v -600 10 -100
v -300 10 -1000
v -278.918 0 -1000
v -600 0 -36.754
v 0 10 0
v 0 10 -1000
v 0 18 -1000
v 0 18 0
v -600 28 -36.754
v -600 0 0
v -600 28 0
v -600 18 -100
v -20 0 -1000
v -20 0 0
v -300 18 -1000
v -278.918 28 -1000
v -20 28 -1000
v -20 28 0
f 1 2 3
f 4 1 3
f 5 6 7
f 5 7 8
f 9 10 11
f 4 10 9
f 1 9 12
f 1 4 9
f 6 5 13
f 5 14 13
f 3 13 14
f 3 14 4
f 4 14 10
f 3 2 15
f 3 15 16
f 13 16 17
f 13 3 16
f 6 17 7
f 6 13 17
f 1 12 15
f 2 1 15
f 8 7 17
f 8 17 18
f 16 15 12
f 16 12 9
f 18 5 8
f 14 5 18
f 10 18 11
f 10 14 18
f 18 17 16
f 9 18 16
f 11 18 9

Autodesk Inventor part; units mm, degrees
ref_plane "YZ Plane" through (0, 0, 0) normal (1, 0, 0) x (0, 1, 0)
ref_plane "XZ Plane" through (0, 0, 0) normal (0, 1, 0) x (-1, 0, 0)
sketch "Sketch1" plane through (0, 0, 0) normal (0, 1, 0) x (-1, 0, 0)
  line L0 (0, 0) -> (600, 0)
  line L1 (600, 0) -> (600, -1000)
  line L2 (600, -1000) -> (0, -1000)
  line L3 (0, -1000) -> (0, 0)
  dimension "d0" = 1000
  dimension "d1" = 600
extrude "Extrusion1" add sketch "Sketch1" along normal blind 28
sketch "Sketch2" plane through (0, 28, 0) normal (0, 1, 0) x (1, 0, 0)
  line L0 (-600, 1000) -> (-600, 0) projected
  line L1 (0, 1000) -> (-600, 1000) projected
  line L2 (0, 1000) -> (-600, 1000) projected
  line L3 (-600, 1000) -> (-600, 0) projected
  line L4 (-600, 0) -> (0, 0) projected
  line L5 (0, 0) -> (0, 1000) projected
  line L6 (-600, 100) -> (-300, 1000)
  dimension "d7" = 300
  dimension "d8" = 100
extrude "Extrusion2" cut sketch "Sketch2" against normal blind 200 contours L1 L6 L0
ref_plane "Work Plane1" through (0, 14, 0) normal (0, 1, 0) x (1, 0, 0)
sketch "Sketch3" plane through (0, 28, 0) normal (0, 1, 0) x (1, 0, 0)
  circle A0 centre (-305, 20) radius 8
  line L0 (0, 0) -> (0, 1000) projected
  line L1 (-600, 0) -> (0, 0) projected
  circle A1 centre (-395, 20) radius 8
  circle A2 centre (-350, 75) radius 8
  circle A3 centre (-350, 160) radius 8
  dimension "d9" = 16
  dimension "d10" = 305
  dimension "d11" = 20
  dimension "d12" = 16
  dimension "d13" = 395
  dimension "d14" = 20
  dimension "d15" = 16
  dimension "d16" = 350
  dimension "d17" = 75
  dimension "d18" = 16
  dimension "d19" = 350
  dimension "d20" = 160
extrude "Extrusion3" [suppressed]
chamfer "Chamfer1" distance 20 distance2 10 1 edges at (0, 28, -500) measured on face at (-300, 28, -366.6667)
chamfer "Chamfer2" distance 10 distance2 20 1 edges at (0, 0, -500) measured on face at (0, 6, -333.3333)
chamfer "Chamfer3" distance 20 distance2 10 1 edges at (-450, 28, -550) measured on face at (-306.6667, 28, -366.6667)
chamfer "Chamfer4" distance 20 distance2 10 1 edges at (-450, 0, -550) measured on face at (-306.6667, 0, -366.6667)
properties part number "Foam_wing"
